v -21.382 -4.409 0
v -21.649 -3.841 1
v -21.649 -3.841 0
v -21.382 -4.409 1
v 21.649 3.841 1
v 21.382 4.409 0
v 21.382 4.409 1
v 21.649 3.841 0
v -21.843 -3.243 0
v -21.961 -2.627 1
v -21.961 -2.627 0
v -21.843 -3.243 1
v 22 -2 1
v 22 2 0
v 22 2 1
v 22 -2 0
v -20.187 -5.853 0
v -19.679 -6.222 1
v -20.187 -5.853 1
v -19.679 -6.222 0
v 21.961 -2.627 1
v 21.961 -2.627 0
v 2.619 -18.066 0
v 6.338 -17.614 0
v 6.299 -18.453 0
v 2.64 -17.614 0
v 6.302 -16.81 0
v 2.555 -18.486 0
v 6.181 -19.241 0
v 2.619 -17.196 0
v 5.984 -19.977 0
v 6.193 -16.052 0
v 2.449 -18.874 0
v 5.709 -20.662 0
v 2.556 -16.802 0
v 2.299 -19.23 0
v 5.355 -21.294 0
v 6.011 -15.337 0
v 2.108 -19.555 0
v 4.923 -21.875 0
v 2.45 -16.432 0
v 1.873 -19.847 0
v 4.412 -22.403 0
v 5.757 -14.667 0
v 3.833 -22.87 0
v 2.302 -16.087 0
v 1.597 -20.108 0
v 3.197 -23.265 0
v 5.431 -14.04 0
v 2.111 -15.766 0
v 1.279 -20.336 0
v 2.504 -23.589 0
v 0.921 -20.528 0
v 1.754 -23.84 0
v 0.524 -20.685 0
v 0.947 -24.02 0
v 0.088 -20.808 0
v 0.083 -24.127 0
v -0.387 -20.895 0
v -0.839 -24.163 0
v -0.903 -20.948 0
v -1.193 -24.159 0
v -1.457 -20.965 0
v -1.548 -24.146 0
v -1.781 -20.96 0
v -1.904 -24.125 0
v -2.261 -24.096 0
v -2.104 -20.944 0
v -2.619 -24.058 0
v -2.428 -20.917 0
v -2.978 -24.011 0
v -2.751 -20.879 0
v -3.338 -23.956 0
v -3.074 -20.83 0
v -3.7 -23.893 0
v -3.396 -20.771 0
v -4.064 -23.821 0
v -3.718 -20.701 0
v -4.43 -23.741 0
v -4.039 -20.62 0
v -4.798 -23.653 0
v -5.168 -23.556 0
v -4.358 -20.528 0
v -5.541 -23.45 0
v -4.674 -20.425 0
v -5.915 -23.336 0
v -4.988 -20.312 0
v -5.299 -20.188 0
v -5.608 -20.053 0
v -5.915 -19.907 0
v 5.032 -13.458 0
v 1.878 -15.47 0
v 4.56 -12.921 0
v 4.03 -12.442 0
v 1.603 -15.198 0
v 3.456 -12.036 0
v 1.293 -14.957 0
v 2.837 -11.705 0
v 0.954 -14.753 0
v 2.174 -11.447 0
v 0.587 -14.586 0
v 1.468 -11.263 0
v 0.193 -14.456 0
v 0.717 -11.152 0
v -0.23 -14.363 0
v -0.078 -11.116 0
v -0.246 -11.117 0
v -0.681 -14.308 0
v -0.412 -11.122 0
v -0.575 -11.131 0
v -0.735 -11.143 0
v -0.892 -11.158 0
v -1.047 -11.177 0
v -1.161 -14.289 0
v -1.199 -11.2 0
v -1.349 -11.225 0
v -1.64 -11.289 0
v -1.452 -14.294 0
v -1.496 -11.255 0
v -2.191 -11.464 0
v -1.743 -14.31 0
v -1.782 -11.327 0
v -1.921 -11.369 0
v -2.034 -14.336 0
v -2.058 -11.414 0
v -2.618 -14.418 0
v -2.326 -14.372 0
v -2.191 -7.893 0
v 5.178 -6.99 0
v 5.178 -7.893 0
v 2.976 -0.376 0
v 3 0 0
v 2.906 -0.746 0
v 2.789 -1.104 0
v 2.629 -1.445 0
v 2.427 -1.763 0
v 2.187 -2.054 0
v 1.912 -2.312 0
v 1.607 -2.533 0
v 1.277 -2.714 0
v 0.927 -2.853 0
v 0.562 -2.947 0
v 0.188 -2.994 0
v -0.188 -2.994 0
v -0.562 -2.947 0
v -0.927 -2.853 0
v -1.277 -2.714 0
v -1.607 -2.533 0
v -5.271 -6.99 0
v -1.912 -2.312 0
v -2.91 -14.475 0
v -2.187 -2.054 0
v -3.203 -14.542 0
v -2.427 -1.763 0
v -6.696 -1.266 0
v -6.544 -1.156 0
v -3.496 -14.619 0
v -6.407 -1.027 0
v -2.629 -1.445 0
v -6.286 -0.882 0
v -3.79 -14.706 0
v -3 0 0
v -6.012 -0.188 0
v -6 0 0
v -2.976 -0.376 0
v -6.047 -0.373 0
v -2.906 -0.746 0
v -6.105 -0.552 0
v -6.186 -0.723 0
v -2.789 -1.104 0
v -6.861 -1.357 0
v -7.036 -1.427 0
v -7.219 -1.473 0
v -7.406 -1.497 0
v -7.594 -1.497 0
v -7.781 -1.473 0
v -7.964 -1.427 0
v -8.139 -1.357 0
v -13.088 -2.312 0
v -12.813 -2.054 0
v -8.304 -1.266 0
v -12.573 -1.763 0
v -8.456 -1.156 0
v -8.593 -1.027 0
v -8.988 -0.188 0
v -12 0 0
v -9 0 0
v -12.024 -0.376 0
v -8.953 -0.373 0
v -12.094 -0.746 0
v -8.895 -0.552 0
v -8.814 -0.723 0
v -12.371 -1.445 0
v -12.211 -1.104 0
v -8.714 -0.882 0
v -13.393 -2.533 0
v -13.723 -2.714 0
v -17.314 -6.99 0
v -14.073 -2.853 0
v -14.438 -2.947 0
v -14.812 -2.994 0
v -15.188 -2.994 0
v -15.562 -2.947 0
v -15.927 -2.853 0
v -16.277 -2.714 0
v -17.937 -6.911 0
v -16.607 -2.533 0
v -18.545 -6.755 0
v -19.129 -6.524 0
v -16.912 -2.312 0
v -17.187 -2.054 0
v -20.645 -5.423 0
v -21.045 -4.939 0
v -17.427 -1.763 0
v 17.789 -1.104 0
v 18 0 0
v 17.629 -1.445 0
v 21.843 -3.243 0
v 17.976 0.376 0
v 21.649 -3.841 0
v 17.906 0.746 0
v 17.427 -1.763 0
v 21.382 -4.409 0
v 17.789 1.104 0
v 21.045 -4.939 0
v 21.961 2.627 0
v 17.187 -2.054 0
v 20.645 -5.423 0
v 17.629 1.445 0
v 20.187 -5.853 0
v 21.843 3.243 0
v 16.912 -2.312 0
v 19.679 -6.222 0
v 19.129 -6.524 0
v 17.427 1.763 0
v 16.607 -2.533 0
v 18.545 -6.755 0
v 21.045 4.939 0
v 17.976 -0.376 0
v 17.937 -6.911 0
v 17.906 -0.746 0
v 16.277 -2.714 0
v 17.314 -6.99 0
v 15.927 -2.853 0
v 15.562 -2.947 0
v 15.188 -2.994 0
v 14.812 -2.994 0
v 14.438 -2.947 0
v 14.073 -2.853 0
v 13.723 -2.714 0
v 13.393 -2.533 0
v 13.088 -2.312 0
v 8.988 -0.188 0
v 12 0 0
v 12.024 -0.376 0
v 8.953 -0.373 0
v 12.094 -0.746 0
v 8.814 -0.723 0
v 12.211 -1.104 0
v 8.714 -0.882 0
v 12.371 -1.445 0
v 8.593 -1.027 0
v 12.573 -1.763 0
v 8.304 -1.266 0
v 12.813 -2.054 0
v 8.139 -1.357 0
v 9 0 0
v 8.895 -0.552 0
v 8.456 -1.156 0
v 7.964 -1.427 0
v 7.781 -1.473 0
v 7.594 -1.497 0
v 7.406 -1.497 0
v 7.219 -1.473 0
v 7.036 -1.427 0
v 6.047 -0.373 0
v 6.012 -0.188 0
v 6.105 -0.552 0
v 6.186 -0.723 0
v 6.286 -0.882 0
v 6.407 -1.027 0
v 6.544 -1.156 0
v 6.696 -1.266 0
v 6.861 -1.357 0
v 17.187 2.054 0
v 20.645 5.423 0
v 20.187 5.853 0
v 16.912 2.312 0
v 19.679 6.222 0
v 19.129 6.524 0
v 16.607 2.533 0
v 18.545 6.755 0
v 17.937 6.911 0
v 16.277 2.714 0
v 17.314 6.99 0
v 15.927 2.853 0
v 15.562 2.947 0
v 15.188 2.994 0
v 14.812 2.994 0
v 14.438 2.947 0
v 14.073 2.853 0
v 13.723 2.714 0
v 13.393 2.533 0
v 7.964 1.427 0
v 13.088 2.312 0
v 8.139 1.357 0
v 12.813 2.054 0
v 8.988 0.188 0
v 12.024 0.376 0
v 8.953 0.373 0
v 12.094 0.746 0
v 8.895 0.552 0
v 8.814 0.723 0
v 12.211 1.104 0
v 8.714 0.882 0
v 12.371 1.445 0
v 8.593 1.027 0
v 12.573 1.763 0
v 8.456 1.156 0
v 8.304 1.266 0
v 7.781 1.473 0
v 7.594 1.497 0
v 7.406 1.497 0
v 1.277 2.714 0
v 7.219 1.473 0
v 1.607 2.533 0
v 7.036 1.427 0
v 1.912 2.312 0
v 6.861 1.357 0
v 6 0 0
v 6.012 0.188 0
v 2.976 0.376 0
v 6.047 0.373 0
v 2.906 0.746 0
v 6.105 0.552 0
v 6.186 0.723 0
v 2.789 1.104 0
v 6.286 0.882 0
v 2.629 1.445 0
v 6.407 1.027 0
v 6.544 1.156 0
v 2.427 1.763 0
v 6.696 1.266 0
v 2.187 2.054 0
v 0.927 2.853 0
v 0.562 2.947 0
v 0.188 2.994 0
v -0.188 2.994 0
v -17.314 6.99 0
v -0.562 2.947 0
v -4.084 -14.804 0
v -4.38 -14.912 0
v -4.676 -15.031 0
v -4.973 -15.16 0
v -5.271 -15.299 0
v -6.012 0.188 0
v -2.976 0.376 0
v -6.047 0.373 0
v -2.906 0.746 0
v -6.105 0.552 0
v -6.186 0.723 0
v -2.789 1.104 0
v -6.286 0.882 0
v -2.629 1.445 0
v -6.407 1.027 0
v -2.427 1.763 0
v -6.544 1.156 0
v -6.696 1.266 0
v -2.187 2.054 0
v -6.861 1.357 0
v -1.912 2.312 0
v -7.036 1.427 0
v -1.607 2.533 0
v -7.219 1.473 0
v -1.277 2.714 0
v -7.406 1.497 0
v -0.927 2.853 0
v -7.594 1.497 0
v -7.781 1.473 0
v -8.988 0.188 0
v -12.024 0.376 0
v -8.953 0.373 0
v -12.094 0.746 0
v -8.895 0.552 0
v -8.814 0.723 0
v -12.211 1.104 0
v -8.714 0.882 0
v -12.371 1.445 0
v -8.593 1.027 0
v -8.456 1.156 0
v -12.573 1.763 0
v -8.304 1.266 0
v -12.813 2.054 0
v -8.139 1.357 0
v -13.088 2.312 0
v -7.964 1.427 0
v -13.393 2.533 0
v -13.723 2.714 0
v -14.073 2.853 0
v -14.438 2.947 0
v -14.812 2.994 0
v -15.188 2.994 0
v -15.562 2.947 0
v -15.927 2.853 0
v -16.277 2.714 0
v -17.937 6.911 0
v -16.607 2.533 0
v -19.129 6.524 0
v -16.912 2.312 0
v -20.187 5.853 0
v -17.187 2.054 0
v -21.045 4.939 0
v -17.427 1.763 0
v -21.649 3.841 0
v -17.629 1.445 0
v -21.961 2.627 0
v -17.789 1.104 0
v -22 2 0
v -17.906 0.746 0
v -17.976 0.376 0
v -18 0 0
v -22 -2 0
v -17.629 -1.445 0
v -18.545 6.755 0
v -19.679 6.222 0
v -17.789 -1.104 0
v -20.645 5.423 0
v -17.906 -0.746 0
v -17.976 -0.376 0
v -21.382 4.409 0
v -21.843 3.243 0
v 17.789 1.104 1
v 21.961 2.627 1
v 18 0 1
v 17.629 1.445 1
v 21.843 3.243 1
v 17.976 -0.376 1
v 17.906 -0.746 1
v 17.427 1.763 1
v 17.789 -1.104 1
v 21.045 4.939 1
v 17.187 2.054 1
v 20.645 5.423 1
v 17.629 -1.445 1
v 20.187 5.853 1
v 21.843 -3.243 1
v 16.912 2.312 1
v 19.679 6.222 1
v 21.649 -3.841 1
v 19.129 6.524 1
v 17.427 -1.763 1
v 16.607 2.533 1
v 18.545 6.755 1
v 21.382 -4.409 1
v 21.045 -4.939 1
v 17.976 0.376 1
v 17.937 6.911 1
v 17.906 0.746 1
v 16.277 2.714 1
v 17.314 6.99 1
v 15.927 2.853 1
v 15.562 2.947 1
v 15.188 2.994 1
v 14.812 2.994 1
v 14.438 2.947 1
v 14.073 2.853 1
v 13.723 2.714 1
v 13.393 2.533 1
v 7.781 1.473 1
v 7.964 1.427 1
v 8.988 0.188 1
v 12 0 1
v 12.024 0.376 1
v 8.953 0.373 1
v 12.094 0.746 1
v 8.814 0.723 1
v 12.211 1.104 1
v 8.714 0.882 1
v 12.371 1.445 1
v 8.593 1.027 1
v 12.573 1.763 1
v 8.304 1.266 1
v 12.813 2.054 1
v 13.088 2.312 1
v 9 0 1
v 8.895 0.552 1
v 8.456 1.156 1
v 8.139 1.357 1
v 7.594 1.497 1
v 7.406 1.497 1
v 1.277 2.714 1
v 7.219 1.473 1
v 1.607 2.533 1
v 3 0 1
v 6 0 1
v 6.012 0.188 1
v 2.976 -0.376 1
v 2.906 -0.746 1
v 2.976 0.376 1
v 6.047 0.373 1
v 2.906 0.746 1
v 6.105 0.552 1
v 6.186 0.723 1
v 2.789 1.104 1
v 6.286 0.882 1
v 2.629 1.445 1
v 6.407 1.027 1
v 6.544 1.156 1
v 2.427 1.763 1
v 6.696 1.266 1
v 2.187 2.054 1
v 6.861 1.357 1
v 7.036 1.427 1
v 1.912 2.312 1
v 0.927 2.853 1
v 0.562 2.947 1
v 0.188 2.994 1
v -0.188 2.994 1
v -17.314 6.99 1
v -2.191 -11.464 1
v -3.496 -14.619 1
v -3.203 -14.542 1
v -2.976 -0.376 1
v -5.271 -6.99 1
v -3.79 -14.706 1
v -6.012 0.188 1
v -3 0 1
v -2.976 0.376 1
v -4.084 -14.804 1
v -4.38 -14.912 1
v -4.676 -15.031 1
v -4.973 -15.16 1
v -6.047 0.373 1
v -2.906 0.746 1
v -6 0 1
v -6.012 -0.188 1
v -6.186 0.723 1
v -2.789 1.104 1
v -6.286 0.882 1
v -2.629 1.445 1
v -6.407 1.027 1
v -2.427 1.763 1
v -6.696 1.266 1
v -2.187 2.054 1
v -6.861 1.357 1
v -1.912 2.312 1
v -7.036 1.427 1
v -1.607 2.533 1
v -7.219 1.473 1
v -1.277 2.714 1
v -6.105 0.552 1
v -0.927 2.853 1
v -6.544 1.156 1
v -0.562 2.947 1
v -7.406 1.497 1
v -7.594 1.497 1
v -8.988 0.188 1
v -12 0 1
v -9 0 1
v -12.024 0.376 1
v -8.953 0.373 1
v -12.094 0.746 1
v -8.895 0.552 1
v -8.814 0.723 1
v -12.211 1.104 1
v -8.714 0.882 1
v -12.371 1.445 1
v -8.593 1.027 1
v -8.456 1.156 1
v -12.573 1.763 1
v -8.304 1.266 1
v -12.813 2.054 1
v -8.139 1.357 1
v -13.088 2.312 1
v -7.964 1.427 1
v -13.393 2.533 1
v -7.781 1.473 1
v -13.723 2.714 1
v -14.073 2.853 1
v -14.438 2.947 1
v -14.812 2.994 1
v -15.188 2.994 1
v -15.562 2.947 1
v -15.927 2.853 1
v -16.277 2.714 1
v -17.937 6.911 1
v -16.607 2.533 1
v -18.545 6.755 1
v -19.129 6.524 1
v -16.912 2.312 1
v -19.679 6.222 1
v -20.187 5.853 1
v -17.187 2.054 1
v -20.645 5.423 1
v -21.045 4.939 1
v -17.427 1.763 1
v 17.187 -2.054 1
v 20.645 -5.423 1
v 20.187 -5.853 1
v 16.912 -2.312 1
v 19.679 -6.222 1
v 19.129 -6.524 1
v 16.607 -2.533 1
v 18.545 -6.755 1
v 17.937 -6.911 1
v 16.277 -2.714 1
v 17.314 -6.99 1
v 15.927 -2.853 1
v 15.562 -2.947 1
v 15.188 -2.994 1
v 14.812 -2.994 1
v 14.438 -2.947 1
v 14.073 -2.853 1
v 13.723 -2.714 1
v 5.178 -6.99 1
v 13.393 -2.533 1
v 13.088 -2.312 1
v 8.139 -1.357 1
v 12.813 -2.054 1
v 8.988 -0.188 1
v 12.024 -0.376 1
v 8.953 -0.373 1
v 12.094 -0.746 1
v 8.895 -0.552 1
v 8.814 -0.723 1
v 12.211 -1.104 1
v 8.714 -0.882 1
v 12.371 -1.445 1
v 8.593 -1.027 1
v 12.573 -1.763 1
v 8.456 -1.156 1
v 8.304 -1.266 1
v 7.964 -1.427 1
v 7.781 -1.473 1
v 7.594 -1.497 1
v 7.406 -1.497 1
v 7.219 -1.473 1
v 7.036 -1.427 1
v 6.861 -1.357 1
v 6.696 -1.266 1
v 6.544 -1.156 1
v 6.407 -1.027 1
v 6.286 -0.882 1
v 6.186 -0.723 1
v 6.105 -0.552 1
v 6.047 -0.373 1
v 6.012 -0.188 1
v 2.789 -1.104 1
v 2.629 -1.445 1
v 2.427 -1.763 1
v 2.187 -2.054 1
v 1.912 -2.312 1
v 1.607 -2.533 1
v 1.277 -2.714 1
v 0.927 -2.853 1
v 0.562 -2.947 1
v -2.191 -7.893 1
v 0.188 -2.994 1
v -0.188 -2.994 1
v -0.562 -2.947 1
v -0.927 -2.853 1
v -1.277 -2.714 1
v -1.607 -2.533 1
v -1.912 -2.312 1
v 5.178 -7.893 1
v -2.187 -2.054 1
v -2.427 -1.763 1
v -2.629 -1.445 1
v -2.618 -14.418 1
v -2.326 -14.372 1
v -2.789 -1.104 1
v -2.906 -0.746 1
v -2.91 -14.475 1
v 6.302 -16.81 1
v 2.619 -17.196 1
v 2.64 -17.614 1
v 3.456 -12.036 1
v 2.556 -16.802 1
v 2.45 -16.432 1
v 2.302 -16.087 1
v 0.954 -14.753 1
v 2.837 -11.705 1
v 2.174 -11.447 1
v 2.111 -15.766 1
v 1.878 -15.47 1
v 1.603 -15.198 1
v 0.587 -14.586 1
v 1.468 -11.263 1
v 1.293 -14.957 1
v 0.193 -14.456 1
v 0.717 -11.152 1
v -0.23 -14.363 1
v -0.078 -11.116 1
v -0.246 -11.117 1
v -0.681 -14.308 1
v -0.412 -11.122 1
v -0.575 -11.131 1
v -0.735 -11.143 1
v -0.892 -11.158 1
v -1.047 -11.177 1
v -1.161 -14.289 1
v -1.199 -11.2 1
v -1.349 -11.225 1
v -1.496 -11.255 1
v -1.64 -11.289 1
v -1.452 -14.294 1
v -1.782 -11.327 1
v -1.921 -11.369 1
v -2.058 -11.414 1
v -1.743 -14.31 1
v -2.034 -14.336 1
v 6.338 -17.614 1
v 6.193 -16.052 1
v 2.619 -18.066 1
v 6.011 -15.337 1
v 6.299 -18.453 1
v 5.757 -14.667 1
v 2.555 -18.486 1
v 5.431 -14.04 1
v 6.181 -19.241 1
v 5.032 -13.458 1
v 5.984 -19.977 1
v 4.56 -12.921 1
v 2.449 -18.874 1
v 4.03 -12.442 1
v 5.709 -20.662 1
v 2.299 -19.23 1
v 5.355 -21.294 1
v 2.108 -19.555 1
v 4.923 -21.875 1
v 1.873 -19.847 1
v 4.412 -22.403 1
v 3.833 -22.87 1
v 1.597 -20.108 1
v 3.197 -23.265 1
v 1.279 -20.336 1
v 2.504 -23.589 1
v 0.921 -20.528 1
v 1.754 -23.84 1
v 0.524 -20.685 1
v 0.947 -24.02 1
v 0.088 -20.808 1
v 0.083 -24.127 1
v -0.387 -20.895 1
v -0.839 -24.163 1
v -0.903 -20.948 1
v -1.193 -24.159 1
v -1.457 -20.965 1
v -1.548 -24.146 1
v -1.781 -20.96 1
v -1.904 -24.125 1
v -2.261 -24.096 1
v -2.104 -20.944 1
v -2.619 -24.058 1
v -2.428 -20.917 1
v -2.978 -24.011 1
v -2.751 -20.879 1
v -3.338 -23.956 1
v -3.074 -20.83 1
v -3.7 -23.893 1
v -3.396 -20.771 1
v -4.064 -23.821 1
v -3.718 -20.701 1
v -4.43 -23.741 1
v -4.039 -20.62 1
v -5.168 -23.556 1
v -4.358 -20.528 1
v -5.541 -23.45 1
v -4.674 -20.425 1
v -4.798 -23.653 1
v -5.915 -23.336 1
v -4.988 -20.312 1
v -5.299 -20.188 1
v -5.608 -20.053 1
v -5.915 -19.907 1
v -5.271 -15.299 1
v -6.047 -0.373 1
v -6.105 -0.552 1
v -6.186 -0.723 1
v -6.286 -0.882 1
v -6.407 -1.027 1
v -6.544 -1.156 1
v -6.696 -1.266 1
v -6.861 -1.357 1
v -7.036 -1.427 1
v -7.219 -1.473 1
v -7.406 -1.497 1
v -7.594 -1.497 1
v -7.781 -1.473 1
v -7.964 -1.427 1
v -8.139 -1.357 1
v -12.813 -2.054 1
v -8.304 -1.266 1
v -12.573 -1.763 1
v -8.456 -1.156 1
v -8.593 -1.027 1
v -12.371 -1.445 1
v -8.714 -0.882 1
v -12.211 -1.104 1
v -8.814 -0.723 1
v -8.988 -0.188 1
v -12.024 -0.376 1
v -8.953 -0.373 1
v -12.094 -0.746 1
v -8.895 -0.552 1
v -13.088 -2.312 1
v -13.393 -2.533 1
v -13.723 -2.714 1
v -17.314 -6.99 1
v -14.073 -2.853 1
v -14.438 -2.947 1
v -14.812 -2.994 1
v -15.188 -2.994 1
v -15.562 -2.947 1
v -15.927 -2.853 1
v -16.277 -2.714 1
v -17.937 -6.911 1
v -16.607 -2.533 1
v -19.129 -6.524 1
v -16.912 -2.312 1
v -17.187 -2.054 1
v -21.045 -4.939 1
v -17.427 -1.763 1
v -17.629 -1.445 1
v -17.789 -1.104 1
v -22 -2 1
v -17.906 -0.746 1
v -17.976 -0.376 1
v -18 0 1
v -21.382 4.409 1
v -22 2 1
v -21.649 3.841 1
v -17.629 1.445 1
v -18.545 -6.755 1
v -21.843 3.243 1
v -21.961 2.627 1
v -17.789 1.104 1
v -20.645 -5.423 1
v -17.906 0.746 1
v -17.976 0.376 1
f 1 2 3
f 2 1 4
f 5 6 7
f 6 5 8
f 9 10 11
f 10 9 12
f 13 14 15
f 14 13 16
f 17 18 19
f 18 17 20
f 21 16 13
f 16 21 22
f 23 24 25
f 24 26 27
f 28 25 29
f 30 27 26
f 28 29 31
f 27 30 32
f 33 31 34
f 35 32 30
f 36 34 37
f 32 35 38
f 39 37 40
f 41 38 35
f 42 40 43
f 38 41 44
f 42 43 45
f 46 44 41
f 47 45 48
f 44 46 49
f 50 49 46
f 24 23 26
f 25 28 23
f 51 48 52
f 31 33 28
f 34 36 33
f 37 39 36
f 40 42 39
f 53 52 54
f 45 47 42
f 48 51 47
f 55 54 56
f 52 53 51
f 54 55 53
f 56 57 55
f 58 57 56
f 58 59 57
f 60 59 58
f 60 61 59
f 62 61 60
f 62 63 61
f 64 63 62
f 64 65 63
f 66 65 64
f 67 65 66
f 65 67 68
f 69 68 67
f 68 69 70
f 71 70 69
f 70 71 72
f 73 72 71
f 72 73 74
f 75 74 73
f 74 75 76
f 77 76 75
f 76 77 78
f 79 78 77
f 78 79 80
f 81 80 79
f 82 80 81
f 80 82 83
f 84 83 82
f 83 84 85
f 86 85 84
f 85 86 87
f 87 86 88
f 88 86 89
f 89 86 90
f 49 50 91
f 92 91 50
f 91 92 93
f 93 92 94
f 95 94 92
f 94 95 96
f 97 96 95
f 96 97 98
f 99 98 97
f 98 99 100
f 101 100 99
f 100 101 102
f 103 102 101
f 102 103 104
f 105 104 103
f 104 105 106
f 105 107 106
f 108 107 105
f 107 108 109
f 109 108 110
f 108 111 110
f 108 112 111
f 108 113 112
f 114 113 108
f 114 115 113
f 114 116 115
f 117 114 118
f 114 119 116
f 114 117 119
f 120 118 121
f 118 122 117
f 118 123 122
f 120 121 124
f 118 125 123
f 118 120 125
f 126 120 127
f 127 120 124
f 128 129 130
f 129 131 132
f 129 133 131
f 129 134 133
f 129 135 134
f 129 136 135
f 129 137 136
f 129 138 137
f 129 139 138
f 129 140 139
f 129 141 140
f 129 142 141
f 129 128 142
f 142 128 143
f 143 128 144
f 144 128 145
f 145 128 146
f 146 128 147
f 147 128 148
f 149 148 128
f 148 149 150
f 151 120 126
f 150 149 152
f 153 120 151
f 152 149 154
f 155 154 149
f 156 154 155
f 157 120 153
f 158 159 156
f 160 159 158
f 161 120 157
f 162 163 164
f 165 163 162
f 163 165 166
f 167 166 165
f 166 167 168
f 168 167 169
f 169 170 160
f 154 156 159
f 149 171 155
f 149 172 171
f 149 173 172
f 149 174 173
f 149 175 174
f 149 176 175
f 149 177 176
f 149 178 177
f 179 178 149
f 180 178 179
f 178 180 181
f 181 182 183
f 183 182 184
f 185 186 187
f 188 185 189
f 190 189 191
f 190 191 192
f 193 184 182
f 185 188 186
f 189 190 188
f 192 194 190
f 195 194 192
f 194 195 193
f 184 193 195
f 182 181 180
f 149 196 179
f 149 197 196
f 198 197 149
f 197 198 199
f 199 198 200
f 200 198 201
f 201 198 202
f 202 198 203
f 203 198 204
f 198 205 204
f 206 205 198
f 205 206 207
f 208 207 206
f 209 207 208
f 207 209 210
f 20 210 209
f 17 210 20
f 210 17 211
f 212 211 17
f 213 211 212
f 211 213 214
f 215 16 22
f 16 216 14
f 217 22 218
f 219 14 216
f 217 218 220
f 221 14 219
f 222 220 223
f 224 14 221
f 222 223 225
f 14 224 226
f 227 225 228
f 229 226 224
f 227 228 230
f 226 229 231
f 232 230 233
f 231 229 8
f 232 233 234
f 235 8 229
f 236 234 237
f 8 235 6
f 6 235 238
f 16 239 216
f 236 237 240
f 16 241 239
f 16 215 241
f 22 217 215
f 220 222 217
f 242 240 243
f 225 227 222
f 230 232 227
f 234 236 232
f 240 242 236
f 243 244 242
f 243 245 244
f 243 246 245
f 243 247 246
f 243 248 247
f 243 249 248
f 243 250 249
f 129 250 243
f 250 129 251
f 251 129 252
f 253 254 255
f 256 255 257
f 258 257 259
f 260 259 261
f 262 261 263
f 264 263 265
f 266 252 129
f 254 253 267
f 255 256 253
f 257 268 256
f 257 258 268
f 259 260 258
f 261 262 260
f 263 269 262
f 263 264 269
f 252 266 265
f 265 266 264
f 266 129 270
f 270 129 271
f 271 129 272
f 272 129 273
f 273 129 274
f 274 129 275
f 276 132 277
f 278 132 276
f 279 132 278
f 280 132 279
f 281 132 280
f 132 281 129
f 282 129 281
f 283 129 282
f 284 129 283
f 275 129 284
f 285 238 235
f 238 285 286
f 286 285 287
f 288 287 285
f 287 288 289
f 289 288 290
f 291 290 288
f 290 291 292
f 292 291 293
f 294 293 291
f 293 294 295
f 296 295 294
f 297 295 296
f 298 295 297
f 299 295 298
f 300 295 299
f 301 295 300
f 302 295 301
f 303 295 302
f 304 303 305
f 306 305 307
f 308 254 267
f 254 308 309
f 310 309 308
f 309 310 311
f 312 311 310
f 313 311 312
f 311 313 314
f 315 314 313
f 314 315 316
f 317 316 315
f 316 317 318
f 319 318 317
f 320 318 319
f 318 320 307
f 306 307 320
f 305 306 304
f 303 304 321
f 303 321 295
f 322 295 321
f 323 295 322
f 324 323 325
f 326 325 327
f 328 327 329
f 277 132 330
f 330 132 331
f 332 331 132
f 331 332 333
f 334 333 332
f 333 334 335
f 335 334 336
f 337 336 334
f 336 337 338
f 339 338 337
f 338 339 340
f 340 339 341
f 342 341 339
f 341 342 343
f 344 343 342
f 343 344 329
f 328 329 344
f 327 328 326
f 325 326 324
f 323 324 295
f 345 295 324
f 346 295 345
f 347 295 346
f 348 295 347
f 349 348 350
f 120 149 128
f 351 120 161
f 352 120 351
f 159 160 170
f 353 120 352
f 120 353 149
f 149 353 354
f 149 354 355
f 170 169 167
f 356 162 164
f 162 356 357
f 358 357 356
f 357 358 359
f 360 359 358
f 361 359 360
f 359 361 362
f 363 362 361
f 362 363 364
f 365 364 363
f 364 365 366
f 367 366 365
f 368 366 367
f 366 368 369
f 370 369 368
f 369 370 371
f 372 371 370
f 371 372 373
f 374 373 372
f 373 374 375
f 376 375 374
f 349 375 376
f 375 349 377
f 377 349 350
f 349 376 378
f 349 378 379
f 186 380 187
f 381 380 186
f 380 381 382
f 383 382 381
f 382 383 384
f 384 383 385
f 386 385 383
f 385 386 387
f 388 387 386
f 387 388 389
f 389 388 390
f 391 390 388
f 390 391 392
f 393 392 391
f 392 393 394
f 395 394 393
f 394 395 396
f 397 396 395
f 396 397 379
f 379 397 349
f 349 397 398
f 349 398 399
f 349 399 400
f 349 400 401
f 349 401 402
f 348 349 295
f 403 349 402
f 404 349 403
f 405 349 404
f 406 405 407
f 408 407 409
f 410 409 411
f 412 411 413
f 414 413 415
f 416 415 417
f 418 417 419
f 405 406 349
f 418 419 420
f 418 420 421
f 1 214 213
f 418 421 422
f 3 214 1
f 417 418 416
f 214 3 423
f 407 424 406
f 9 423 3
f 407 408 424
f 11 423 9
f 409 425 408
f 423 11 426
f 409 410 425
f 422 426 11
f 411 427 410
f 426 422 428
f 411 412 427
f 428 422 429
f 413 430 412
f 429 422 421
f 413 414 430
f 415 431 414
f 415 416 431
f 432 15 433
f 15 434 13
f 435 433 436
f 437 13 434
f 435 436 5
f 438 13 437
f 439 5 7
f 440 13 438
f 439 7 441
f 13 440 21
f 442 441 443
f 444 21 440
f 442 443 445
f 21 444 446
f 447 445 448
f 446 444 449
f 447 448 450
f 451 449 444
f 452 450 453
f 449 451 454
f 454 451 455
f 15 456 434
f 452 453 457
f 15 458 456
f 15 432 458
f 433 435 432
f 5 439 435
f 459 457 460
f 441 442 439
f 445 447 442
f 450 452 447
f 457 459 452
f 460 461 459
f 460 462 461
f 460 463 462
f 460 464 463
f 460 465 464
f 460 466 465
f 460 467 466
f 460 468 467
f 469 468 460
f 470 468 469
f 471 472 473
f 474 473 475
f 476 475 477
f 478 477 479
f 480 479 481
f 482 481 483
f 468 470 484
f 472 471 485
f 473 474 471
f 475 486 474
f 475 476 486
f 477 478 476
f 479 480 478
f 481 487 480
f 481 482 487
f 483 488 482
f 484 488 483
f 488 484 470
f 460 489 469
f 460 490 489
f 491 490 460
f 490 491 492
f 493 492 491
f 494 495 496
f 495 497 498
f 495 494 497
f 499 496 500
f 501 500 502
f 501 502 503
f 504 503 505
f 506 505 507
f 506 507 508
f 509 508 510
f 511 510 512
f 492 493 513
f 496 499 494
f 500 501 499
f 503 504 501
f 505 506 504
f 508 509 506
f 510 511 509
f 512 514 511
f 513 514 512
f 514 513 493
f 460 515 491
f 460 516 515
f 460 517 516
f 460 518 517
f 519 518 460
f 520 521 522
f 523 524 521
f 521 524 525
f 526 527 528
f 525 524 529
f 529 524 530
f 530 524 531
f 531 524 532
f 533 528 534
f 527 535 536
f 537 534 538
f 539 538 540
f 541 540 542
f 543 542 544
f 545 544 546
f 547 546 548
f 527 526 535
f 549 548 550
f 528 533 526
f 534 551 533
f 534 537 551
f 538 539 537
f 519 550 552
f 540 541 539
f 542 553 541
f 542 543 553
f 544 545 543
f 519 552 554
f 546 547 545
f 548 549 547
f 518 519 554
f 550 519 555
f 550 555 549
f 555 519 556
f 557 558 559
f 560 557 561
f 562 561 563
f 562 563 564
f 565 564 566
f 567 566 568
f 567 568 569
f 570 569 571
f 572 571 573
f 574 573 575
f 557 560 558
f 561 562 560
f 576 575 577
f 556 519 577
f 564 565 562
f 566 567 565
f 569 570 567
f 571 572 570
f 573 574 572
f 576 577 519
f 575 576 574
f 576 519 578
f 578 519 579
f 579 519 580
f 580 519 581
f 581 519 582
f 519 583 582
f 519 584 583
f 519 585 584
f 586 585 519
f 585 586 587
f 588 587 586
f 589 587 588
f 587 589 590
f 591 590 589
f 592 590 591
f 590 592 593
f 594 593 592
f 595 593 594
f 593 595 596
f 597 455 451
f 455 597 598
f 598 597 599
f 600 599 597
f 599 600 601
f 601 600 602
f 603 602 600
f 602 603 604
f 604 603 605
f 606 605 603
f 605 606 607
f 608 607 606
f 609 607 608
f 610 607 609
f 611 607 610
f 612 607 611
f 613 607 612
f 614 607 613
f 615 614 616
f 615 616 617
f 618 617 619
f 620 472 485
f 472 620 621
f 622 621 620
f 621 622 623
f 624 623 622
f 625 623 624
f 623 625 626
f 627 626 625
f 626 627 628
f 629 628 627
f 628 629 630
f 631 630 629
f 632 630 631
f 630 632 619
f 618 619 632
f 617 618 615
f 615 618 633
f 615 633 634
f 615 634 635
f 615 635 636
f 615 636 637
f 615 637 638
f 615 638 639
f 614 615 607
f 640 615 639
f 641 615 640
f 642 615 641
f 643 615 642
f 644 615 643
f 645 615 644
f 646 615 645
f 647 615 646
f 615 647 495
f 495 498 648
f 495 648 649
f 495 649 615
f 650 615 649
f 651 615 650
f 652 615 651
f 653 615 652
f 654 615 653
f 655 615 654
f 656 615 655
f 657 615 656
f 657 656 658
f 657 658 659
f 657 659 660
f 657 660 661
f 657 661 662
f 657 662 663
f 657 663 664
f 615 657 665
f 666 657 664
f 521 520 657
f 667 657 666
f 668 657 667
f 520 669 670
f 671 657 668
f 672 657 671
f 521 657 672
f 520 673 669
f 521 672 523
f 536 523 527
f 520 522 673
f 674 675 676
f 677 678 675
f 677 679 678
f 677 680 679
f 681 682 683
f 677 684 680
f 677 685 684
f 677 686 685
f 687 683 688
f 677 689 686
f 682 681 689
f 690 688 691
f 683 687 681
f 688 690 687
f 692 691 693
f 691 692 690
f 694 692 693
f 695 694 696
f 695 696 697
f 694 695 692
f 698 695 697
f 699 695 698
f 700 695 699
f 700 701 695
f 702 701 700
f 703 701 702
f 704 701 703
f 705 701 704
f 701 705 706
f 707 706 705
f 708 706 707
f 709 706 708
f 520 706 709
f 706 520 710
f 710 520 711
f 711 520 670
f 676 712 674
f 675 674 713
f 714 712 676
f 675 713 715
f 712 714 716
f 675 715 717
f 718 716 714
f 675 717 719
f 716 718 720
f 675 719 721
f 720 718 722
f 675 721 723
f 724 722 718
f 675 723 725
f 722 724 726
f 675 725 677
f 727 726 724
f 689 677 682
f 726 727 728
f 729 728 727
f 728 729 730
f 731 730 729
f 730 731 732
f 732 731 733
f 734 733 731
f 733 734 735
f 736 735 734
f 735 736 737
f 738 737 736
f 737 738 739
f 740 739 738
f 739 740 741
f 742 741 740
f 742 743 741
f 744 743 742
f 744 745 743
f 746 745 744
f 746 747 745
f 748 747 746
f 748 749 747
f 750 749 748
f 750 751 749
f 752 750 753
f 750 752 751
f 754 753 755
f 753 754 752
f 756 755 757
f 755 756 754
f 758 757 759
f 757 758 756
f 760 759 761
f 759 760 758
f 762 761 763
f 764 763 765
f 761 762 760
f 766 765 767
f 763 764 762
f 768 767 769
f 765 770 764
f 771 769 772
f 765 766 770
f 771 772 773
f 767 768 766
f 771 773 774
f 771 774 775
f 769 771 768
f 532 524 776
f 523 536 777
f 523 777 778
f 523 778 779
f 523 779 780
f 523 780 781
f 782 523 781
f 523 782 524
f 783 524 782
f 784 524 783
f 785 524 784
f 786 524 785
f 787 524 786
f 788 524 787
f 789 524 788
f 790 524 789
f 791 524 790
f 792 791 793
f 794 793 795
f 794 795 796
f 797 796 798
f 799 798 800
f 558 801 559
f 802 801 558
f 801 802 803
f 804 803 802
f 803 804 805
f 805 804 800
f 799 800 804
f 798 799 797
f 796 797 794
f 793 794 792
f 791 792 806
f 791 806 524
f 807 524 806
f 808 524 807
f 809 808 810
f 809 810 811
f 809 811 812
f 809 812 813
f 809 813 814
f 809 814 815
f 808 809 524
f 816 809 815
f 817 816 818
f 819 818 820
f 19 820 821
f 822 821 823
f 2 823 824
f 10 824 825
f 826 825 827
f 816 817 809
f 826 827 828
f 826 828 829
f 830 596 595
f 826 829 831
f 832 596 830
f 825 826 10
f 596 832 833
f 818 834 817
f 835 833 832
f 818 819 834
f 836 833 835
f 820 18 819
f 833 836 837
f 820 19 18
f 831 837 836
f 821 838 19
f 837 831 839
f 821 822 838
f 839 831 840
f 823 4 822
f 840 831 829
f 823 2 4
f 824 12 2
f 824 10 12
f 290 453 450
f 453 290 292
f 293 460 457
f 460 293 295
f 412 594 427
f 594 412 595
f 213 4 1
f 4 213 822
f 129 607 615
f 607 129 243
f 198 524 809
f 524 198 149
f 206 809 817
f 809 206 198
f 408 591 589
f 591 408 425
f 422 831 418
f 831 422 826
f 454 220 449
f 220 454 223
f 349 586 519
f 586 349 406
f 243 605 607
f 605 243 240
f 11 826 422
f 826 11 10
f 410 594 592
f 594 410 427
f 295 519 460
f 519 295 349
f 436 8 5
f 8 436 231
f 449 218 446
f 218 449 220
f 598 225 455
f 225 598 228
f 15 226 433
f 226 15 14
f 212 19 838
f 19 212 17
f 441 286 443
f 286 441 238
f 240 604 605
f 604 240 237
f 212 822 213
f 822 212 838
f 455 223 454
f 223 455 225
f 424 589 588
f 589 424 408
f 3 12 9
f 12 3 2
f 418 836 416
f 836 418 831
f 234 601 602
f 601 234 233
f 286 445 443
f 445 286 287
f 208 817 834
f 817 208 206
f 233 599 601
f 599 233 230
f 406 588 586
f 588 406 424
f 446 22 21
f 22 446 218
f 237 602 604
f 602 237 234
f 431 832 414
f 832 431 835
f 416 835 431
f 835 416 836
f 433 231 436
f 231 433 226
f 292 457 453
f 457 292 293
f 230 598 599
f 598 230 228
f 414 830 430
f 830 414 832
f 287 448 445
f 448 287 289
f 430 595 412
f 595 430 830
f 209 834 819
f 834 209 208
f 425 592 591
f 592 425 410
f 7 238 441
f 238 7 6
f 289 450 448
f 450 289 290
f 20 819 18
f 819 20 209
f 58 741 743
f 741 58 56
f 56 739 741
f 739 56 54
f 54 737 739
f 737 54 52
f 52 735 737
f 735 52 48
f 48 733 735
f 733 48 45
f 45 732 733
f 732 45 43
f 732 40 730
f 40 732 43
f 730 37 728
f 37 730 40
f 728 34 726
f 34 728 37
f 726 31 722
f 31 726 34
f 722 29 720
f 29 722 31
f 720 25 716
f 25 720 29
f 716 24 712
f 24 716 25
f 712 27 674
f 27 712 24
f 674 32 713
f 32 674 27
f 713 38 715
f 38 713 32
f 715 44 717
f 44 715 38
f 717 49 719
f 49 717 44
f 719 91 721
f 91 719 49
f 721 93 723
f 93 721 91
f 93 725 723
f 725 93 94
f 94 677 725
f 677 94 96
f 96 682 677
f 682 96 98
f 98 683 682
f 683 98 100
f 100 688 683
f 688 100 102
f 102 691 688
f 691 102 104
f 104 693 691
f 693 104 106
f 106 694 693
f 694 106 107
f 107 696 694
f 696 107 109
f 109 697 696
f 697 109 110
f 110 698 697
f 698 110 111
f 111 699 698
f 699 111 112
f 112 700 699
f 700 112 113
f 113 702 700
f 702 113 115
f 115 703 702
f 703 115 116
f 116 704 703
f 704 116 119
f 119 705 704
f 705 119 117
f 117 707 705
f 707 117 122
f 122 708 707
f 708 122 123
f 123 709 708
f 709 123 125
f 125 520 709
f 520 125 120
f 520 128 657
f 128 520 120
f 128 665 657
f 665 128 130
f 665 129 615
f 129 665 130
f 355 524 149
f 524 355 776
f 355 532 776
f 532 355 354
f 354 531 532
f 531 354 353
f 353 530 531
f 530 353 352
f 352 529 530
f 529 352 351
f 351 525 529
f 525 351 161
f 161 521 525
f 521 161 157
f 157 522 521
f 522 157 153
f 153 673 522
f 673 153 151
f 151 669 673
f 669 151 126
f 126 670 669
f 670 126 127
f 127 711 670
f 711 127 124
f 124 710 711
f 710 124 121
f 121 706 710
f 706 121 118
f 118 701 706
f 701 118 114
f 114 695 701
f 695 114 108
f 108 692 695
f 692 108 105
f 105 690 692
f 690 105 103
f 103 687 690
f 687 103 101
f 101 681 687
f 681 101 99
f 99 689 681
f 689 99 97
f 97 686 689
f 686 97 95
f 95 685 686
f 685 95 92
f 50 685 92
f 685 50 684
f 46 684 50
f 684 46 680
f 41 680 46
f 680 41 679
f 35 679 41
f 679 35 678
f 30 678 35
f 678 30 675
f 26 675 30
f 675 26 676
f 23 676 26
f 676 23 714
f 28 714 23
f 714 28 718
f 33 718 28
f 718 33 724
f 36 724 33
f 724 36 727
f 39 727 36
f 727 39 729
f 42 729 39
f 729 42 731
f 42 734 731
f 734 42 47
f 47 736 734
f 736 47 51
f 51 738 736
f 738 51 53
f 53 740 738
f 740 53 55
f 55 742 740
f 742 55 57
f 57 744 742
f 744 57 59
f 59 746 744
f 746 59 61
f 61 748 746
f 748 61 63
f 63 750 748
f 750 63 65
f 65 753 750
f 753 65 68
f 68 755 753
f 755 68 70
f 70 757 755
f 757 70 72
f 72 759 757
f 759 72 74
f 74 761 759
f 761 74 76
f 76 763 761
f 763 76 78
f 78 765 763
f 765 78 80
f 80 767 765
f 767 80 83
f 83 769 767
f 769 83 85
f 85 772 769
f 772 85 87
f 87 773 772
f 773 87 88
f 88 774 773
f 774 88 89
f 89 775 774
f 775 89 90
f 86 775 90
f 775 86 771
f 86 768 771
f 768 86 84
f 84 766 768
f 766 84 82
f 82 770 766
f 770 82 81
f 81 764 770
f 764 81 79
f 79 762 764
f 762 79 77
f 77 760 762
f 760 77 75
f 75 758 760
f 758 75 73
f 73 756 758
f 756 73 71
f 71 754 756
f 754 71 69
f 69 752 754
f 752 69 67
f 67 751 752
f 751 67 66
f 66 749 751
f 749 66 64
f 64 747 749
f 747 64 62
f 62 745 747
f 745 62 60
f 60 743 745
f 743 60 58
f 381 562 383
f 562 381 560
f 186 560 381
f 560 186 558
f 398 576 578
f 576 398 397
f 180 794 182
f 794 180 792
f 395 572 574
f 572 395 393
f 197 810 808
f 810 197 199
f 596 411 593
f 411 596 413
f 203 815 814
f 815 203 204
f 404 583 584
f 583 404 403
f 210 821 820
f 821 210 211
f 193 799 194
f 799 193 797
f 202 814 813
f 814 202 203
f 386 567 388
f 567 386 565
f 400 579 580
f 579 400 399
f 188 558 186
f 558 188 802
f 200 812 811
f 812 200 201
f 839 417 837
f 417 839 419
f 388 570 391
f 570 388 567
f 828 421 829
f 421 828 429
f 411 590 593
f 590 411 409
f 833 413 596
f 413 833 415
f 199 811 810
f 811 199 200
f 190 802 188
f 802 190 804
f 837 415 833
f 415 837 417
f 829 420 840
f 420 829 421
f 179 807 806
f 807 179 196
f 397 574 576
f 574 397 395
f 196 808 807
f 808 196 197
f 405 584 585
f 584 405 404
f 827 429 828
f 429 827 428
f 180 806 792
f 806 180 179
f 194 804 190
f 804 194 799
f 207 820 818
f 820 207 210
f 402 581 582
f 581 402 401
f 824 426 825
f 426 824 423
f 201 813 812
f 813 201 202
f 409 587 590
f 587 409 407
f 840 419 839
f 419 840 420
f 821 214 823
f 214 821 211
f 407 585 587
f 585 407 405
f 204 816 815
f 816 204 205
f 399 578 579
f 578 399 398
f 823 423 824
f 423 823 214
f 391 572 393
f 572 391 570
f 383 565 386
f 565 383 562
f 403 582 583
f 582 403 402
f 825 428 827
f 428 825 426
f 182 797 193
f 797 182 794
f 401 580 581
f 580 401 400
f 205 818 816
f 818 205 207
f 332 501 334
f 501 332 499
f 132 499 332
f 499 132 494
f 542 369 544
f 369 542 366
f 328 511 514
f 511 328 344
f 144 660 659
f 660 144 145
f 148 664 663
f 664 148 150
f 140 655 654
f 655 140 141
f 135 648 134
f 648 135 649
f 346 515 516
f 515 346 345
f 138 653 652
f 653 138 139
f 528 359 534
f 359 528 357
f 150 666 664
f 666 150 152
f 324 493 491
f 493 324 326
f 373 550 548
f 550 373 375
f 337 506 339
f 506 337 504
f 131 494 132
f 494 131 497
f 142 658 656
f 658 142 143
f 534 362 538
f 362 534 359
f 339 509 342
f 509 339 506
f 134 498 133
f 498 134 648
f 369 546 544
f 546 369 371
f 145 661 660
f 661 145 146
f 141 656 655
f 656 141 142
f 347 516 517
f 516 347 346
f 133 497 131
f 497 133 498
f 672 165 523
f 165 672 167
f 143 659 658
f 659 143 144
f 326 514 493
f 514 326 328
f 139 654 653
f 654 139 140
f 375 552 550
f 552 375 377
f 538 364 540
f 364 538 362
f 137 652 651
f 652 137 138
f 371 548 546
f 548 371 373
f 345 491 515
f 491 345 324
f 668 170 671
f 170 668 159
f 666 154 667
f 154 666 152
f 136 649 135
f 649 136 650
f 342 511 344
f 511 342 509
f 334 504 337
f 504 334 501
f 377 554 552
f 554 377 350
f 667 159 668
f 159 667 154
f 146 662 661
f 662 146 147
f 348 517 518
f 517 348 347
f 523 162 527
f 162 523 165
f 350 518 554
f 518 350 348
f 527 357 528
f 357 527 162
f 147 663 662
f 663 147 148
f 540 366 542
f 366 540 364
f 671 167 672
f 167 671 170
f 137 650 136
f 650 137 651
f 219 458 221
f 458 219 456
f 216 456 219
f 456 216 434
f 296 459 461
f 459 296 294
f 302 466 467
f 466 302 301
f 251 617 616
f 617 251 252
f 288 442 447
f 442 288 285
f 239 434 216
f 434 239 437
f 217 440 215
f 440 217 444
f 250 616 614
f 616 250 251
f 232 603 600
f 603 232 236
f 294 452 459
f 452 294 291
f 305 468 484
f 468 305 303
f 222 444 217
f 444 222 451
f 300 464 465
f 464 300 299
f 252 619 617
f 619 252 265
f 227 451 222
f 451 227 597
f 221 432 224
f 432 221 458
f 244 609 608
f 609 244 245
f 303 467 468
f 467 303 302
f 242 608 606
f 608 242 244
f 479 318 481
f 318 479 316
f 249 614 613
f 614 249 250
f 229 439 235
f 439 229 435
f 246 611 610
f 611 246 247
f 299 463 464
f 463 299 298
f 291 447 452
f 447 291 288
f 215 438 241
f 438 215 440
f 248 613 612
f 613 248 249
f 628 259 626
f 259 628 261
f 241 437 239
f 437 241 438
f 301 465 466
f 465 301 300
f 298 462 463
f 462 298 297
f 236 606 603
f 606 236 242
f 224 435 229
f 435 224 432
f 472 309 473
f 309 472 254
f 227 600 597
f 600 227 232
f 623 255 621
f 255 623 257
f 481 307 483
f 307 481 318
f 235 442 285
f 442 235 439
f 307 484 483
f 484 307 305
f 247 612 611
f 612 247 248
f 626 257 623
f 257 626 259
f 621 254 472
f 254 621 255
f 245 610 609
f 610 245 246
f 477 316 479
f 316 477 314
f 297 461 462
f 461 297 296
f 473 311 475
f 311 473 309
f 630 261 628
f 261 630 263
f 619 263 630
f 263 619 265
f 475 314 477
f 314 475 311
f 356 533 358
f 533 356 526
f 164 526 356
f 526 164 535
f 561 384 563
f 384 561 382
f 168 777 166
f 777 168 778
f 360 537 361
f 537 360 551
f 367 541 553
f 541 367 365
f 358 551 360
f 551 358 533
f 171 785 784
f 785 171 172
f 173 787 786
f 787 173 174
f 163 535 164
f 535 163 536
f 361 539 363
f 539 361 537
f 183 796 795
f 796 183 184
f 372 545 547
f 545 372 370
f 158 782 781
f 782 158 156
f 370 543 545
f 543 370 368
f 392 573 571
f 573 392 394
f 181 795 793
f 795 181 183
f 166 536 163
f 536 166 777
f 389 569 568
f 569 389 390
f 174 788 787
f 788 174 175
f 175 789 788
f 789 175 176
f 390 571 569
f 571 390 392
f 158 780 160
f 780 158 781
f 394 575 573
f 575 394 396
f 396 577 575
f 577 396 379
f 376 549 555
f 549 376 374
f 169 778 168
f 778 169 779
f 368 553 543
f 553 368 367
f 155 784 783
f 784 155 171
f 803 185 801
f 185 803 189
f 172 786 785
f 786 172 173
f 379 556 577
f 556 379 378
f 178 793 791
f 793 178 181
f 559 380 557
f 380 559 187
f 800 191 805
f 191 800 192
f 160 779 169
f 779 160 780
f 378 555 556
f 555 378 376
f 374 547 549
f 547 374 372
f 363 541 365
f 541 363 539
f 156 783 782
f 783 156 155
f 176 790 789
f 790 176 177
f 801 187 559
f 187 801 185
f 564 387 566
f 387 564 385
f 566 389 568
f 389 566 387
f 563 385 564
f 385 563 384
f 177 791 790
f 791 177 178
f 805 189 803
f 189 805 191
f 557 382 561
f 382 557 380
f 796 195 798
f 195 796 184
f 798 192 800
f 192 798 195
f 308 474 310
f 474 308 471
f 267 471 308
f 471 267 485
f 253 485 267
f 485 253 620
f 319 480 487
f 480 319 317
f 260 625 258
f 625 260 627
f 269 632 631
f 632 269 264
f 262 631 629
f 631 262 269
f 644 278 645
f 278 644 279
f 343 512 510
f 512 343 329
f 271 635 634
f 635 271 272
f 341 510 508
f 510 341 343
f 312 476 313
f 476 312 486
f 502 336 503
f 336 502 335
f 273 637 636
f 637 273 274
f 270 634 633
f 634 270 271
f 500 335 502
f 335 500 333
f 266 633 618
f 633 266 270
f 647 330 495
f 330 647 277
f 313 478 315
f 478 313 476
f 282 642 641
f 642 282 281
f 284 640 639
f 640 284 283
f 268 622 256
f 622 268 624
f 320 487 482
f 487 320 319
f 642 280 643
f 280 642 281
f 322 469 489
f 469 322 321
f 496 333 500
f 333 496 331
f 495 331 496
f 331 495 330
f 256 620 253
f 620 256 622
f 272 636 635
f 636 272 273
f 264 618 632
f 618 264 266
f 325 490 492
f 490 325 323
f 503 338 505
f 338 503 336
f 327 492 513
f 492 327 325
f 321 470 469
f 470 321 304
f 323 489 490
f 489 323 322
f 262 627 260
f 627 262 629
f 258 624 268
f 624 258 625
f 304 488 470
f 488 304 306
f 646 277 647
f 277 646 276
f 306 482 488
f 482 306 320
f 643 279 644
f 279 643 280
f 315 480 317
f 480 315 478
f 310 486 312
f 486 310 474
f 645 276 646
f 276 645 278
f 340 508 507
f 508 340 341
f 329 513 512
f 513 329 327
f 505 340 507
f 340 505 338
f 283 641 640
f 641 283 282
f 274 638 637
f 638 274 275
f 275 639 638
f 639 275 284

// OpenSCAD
$fn = 50;


difference() {
	union() {
		hull() {
			translate(v = [-17.0000000000, 2.0000000000, 0]) {
				cylinder(h = 1, r = 5);
			}
			translate(v = [17.0000000000, 2.0000000000, 0]) {
				cylinder(h = 1, r = 5);
			}
			translate(v = [-17.0000000000, -2.0000000000, 0]) {
				cylinder(h = 1, r = 5);
			}
			translate(v = [17.0000000000, -2.0000000000, 0]) {
				cylinder(h = 1, r = 5);
			}
		}
		translate(v = [0, -5, 0]) {
			linear_extrude(height = 1) {
				text(font = "DejaVu Sans Mono:style=Bold", halign = "center", size = 19.0000000000, text = "5", valign = "top");
			}
		}
	}
	union() {
		translate(v = [-15.0000000000, 0.0000000000, 0]) {
			translate(v = [0, 0, -100]) {
				cylinder(h = 200, r = 3.0000000000);
			}
		}
		translate(v = [0, 0, -100]) {
			cylinder(h = 200, r = 3.0000000000);
		}
		translate(v = [15.0000000000, 0.0000000000, 0]) {
			translate(v = [0, 0, -100]) {
				cylinder(h = 200, r = 3.0000000000);
			}
		}
		translate(v = [-15.0000000000, 0.0000000000, 0]) {
			translate(v = [0, 0, -100]) {
				cylinder(h = 200, r = 1.5000000000);
			}
		}
		translate(v = [-7.5000000000, 0.0000000000, 0]) {
			translate(v = [0, 0, -100]) {
				cylinder(h = 200, r = 1.5000000000);
			}
		}
		translate(v = [0, 0, -100]) {
			cylinder(h = 200, r = 1.5000000000);
		}
		translate(v = [7.5000000000, 0.0000000000, 0]) {
			translate(v = [0, 0, -100]) {
				cylinder(h = 200, r = 1.5000000000);
			}
		}
		translate(v = [15.0000000000, 0.0000000000, 0]) {
			translate(v = [0, 0, -100]) {
				cylinder(h = 200, r = 1.5000000000);
			}
		}
	}
}
